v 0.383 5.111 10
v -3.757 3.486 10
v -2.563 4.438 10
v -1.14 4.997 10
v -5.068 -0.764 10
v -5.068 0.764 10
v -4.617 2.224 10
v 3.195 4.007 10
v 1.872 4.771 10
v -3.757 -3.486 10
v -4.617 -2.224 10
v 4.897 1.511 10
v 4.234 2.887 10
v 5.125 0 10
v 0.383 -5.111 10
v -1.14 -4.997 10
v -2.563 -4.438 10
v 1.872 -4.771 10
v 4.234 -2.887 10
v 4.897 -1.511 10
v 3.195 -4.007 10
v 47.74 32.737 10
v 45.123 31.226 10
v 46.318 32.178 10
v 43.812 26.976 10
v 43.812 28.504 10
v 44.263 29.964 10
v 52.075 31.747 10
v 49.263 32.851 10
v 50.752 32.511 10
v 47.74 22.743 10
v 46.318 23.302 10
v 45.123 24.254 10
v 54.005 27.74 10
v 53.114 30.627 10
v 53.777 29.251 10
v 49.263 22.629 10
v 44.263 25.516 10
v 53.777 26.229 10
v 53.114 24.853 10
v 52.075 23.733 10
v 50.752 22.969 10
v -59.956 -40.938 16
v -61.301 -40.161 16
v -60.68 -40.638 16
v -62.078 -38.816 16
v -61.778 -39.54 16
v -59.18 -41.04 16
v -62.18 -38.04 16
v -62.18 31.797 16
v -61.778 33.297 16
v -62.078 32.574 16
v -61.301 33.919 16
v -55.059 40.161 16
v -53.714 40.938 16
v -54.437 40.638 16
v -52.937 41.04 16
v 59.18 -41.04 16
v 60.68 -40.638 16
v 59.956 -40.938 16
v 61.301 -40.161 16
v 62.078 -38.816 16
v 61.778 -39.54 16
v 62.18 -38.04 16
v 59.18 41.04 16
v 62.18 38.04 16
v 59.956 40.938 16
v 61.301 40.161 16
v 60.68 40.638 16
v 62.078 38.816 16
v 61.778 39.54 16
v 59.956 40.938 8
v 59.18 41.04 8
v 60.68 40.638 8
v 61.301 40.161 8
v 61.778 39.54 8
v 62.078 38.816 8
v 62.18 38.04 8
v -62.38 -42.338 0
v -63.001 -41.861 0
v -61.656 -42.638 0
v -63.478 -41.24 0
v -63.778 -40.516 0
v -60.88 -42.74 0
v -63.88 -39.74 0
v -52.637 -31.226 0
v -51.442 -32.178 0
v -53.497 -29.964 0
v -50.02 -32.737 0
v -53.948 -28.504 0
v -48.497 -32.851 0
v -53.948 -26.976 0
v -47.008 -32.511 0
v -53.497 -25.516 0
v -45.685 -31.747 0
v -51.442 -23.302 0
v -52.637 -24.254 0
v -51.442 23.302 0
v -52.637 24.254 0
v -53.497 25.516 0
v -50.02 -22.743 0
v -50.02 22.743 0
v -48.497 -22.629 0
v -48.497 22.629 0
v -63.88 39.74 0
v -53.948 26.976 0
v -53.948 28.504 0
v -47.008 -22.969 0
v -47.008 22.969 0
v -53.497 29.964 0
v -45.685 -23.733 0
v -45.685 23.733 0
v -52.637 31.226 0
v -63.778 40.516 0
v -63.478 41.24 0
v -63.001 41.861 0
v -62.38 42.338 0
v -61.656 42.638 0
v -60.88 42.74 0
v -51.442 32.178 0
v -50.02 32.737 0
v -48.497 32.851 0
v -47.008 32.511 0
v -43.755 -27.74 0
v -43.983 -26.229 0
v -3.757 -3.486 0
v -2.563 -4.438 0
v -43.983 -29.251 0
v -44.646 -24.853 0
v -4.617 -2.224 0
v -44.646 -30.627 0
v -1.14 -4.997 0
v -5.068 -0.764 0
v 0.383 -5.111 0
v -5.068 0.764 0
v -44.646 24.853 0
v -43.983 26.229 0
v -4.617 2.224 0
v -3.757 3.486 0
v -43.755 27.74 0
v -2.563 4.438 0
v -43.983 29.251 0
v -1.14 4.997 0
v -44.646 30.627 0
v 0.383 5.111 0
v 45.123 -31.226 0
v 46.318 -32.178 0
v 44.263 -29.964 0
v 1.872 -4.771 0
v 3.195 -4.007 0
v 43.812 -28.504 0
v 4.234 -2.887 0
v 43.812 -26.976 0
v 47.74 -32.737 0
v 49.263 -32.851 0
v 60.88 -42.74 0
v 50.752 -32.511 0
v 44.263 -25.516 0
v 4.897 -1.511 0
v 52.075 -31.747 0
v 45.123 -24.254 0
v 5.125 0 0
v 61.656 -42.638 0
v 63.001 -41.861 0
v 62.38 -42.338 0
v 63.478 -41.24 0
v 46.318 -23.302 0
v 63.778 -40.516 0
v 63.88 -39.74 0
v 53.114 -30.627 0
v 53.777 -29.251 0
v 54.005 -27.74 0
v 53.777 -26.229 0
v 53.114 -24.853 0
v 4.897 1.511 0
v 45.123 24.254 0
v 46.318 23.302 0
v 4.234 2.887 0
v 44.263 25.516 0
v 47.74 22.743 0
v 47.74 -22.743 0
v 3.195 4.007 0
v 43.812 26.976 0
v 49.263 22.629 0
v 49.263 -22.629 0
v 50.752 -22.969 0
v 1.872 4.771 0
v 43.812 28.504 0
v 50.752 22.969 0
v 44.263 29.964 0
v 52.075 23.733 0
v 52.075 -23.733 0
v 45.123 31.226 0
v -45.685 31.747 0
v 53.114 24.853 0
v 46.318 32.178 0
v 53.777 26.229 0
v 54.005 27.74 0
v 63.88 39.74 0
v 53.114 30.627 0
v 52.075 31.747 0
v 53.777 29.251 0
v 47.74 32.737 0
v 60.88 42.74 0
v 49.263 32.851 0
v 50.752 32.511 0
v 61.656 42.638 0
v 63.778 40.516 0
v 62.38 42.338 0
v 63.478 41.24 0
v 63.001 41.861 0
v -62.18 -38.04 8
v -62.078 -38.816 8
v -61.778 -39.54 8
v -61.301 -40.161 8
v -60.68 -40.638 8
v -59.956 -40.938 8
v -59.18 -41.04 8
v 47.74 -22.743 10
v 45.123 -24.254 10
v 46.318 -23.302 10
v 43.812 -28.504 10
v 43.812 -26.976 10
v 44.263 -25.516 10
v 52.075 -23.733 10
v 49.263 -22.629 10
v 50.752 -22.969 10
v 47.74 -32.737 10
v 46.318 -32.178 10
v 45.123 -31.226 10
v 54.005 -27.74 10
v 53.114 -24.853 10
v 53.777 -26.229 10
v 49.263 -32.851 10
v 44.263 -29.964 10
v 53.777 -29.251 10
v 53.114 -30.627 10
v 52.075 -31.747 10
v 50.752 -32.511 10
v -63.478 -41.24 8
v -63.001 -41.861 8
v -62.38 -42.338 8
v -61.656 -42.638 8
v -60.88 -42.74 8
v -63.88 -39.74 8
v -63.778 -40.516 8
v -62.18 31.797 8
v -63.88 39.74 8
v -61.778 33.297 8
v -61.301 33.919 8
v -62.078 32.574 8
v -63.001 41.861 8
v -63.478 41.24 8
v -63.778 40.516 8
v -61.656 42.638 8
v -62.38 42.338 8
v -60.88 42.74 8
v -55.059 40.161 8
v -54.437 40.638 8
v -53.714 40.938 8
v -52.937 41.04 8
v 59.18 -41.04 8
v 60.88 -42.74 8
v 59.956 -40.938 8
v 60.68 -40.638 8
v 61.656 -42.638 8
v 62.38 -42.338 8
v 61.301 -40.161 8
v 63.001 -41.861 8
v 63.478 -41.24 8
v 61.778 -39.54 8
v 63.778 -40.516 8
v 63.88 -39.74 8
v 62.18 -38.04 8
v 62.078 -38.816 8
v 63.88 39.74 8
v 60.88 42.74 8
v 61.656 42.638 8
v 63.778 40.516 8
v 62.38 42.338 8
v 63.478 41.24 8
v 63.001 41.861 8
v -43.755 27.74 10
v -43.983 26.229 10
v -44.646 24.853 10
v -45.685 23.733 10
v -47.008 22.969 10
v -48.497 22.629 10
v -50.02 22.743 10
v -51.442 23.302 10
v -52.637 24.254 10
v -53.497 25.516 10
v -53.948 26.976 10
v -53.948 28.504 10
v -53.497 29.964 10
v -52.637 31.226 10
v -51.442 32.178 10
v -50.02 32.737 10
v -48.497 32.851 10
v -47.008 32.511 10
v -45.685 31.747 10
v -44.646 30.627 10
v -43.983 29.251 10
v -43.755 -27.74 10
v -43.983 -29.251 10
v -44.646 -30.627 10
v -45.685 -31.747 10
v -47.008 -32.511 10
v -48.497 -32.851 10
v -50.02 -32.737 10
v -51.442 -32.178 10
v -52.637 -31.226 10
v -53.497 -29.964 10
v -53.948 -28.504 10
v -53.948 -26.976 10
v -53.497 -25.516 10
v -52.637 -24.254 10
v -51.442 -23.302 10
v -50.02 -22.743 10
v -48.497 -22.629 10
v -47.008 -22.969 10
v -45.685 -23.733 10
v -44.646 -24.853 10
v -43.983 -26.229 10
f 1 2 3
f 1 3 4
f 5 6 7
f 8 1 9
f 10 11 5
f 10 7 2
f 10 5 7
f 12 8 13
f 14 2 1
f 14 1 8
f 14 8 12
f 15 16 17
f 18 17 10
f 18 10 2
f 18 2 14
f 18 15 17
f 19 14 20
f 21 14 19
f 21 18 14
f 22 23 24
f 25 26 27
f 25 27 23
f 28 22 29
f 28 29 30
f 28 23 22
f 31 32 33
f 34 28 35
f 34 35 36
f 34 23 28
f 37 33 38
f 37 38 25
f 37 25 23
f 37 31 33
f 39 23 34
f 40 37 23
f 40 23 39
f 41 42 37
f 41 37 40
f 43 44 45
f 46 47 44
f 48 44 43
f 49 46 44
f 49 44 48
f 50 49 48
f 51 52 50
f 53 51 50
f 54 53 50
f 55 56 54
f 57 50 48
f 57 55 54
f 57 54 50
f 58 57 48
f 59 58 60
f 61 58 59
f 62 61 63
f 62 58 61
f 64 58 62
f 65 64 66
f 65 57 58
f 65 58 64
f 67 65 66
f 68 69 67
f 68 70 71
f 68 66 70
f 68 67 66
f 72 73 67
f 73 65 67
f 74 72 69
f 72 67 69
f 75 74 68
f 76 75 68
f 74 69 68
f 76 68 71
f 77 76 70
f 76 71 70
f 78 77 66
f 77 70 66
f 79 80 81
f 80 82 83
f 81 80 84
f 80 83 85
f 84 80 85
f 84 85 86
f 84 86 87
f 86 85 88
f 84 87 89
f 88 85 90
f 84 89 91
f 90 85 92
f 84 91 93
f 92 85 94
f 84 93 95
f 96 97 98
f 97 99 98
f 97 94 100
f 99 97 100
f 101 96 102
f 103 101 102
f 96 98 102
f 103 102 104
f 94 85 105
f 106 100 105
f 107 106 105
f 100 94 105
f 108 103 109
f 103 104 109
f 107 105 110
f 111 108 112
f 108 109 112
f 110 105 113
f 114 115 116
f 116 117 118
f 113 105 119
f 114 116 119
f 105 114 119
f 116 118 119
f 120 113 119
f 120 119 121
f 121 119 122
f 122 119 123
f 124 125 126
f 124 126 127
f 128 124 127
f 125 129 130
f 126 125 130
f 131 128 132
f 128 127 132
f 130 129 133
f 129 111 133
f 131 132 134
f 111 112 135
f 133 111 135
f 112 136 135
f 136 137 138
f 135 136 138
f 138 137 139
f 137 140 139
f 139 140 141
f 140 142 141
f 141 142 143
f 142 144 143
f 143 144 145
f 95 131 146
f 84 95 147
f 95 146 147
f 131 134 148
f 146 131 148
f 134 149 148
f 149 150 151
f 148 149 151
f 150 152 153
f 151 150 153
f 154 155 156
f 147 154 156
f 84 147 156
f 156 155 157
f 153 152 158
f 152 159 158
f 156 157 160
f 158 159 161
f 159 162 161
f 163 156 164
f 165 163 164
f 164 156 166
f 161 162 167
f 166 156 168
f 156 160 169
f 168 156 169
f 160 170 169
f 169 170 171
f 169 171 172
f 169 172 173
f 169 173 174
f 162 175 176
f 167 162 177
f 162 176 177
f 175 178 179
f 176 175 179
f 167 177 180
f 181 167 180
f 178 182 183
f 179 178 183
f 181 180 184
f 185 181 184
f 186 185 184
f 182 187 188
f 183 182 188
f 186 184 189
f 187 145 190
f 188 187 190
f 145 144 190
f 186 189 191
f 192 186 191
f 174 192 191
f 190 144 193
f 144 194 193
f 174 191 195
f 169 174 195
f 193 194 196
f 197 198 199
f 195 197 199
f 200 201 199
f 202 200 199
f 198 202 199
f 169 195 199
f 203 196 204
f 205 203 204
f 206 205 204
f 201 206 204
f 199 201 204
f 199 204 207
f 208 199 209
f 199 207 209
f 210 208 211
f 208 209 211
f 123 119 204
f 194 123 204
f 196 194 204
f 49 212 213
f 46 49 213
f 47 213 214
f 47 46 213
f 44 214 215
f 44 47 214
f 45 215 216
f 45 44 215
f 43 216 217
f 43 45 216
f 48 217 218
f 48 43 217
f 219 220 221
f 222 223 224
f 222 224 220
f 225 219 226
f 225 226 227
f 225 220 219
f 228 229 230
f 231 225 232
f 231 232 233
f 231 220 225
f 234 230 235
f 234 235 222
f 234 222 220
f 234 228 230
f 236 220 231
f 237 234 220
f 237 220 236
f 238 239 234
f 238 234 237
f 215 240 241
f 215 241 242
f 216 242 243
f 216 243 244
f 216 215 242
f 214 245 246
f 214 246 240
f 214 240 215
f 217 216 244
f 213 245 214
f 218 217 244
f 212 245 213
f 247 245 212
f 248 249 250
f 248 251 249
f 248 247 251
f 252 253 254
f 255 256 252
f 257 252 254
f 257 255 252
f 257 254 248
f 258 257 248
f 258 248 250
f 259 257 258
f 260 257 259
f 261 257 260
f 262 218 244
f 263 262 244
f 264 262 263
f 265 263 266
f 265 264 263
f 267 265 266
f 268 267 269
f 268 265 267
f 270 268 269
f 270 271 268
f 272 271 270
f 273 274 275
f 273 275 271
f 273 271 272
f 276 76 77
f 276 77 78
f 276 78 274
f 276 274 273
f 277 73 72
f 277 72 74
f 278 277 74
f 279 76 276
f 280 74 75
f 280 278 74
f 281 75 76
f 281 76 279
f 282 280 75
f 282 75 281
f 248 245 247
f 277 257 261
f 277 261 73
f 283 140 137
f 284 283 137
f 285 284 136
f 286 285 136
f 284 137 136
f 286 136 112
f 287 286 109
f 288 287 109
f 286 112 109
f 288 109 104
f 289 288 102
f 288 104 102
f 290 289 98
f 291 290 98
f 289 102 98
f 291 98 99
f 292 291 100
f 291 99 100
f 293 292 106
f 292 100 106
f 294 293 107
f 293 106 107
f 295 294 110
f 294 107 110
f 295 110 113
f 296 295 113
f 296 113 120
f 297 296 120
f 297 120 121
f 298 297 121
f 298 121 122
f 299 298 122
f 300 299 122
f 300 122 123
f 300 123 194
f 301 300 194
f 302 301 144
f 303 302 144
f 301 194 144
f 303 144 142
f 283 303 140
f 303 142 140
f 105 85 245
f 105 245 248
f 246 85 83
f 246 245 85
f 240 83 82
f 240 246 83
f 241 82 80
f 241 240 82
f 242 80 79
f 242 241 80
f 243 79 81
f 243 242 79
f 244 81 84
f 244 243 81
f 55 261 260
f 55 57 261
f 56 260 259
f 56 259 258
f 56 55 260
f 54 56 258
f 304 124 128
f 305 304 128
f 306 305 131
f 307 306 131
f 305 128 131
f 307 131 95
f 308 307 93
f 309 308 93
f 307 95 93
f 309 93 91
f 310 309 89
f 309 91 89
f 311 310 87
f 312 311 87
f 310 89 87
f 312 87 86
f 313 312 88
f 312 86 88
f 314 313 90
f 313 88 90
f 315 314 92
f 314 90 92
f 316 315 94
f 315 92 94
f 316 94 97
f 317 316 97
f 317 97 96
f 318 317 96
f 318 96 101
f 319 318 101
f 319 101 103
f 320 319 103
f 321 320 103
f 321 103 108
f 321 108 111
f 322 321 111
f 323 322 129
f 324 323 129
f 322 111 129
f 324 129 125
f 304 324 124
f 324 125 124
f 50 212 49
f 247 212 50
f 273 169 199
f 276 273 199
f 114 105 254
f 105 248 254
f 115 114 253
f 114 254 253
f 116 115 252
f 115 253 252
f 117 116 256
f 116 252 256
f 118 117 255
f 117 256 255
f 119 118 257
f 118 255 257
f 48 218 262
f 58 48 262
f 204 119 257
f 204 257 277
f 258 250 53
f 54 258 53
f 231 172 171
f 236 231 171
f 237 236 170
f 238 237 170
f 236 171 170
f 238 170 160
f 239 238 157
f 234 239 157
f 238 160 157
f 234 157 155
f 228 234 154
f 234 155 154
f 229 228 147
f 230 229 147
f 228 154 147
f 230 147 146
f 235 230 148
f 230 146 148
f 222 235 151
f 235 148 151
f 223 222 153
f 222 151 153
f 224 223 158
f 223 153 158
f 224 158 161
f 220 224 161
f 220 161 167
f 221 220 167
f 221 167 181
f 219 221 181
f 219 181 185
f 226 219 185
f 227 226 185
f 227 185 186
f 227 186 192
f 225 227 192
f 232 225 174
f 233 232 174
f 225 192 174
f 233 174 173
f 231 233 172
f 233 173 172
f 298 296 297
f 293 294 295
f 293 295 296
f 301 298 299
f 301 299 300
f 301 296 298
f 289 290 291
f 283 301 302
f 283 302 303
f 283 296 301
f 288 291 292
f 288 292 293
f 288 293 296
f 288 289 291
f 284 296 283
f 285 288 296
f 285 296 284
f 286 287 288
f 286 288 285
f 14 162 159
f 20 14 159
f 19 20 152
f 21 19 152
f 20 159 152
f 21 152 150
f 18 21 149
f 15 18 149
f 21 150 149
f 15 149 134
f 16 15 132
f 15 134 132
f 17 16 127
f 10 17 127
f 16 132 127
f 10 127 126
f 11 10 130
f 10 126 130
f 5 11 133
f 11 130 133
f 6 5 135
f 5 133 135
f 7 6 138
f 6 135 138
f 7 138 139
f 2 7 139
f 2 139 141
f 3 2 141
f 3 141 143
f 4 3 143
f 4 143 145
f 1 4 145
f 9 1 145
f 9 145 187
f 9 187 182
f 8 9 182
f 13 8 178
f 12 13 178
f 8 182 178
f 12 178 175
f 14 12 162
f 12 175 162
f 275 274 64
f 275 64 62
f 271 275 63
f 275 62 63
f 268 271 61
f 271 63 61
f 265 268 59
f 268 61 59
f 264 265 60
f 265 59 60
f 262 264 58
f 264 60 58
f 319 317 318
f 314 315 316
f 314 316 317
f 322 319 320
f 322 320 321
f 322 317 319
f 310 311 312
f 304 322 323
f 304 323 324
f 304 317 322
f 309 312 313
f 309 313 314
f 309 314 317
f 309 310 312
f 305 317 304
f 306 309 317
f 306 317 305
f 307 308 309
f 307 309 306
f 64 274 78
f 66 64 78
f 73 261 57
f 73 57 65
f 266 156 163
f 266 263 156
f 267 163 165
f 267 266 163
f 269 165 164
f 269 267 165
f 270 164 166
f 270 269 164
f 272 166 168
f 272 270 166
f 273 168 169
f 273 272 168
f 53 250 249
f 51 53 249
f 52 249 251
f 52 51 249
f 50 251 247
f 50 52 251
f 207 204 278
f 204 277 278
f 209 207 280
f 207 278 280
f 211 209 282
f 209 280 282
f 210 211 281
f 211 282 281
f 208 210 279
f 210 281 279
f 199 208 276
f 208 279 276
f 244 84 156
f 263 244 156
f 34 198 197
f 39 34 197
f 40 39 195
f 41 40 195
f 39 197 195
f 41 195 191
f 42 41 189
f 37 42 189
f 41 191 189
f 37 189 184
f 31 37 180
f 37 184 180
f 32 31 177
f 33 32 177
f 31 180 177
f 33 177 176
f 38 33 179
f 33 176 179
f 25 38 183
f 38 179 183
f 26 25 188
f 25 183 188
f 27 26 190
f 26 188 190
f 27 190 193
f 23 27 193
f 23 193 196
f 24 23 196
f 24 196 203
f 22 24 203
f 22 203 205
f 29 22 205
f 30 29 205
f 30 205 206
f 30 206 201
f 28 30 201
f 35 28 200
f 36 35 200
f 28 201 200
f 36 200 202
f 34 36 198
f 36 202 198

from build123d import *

# Parameters (mm, degrees)
F0_W     = 127.76
F0_H     = 85.48
F1_DEPTH = 8
F3_W     = 124.36
F3_H     = 82.08
F4_DEPTH = 8
F5_SIZE  = 8
F6_R     = 3
F7_R     = 5.125
F8_DEPTH = 10


with BuildPart() as f1:
    # F0 (on Top) → F1 (new body)
    with BuildSketch(Plane.XY):
        Rectangle(F0_W, F0_H)
    extrude(amount=F1_DEPTH)

    # F3 (on face) → F4 (join)
    with BuildSketch(Plane.XY.offset(8)):
        Rectangle(F3_W, F3_H)
    extrude(amount=F4_DEPTH)

    # F5
    f5_edges = [f1.edges().sort_by_distance(p)[0] for p in [
        (-62.18, 41.04, 12),
    ]]
    chamfer(f5_edges, length=F5_SIZE)

    # F6
    f6_edges = [f1.edges().sort_by_distance(p)[0] for p in [
        (-63.88, 42.74, 4),
        (-63.88, -42.74, 4),
        (63.88, -42.74, 4),
        (63.88, 42.74, 4),
        (-62.18, 33.04, 12),
        (-62.18, -41.04, 12),
        (62.18, -41.04, 12),
        (62.18, 41.04, 12),
        (-54.18, 41.04, 12),
    ]]
    fillet(f6_edges, radius=F6_R)

    # F7 (on face) → F8 (cut)
    with BuildSketch(Plane(origin=(0, 0, 0), x_dir=(1, 0, 0), z_dir=(0, 0, -1))):
        Circle(F7_R)
        with Locations((48.88, 27.74)):
            Circle(F7_R)
        with Locations((48.88, -27.74)):
            Circle(F7_R)
        with Locations((-48.88, -27.74)):
            Circle(F7_R)
        with Locations((-48.88, 27.74)):
            Circle(F7_R)
    extrude(amount=-F8_DEPTH, mode=Mode.SUBTRACT)


solid = f1.part
